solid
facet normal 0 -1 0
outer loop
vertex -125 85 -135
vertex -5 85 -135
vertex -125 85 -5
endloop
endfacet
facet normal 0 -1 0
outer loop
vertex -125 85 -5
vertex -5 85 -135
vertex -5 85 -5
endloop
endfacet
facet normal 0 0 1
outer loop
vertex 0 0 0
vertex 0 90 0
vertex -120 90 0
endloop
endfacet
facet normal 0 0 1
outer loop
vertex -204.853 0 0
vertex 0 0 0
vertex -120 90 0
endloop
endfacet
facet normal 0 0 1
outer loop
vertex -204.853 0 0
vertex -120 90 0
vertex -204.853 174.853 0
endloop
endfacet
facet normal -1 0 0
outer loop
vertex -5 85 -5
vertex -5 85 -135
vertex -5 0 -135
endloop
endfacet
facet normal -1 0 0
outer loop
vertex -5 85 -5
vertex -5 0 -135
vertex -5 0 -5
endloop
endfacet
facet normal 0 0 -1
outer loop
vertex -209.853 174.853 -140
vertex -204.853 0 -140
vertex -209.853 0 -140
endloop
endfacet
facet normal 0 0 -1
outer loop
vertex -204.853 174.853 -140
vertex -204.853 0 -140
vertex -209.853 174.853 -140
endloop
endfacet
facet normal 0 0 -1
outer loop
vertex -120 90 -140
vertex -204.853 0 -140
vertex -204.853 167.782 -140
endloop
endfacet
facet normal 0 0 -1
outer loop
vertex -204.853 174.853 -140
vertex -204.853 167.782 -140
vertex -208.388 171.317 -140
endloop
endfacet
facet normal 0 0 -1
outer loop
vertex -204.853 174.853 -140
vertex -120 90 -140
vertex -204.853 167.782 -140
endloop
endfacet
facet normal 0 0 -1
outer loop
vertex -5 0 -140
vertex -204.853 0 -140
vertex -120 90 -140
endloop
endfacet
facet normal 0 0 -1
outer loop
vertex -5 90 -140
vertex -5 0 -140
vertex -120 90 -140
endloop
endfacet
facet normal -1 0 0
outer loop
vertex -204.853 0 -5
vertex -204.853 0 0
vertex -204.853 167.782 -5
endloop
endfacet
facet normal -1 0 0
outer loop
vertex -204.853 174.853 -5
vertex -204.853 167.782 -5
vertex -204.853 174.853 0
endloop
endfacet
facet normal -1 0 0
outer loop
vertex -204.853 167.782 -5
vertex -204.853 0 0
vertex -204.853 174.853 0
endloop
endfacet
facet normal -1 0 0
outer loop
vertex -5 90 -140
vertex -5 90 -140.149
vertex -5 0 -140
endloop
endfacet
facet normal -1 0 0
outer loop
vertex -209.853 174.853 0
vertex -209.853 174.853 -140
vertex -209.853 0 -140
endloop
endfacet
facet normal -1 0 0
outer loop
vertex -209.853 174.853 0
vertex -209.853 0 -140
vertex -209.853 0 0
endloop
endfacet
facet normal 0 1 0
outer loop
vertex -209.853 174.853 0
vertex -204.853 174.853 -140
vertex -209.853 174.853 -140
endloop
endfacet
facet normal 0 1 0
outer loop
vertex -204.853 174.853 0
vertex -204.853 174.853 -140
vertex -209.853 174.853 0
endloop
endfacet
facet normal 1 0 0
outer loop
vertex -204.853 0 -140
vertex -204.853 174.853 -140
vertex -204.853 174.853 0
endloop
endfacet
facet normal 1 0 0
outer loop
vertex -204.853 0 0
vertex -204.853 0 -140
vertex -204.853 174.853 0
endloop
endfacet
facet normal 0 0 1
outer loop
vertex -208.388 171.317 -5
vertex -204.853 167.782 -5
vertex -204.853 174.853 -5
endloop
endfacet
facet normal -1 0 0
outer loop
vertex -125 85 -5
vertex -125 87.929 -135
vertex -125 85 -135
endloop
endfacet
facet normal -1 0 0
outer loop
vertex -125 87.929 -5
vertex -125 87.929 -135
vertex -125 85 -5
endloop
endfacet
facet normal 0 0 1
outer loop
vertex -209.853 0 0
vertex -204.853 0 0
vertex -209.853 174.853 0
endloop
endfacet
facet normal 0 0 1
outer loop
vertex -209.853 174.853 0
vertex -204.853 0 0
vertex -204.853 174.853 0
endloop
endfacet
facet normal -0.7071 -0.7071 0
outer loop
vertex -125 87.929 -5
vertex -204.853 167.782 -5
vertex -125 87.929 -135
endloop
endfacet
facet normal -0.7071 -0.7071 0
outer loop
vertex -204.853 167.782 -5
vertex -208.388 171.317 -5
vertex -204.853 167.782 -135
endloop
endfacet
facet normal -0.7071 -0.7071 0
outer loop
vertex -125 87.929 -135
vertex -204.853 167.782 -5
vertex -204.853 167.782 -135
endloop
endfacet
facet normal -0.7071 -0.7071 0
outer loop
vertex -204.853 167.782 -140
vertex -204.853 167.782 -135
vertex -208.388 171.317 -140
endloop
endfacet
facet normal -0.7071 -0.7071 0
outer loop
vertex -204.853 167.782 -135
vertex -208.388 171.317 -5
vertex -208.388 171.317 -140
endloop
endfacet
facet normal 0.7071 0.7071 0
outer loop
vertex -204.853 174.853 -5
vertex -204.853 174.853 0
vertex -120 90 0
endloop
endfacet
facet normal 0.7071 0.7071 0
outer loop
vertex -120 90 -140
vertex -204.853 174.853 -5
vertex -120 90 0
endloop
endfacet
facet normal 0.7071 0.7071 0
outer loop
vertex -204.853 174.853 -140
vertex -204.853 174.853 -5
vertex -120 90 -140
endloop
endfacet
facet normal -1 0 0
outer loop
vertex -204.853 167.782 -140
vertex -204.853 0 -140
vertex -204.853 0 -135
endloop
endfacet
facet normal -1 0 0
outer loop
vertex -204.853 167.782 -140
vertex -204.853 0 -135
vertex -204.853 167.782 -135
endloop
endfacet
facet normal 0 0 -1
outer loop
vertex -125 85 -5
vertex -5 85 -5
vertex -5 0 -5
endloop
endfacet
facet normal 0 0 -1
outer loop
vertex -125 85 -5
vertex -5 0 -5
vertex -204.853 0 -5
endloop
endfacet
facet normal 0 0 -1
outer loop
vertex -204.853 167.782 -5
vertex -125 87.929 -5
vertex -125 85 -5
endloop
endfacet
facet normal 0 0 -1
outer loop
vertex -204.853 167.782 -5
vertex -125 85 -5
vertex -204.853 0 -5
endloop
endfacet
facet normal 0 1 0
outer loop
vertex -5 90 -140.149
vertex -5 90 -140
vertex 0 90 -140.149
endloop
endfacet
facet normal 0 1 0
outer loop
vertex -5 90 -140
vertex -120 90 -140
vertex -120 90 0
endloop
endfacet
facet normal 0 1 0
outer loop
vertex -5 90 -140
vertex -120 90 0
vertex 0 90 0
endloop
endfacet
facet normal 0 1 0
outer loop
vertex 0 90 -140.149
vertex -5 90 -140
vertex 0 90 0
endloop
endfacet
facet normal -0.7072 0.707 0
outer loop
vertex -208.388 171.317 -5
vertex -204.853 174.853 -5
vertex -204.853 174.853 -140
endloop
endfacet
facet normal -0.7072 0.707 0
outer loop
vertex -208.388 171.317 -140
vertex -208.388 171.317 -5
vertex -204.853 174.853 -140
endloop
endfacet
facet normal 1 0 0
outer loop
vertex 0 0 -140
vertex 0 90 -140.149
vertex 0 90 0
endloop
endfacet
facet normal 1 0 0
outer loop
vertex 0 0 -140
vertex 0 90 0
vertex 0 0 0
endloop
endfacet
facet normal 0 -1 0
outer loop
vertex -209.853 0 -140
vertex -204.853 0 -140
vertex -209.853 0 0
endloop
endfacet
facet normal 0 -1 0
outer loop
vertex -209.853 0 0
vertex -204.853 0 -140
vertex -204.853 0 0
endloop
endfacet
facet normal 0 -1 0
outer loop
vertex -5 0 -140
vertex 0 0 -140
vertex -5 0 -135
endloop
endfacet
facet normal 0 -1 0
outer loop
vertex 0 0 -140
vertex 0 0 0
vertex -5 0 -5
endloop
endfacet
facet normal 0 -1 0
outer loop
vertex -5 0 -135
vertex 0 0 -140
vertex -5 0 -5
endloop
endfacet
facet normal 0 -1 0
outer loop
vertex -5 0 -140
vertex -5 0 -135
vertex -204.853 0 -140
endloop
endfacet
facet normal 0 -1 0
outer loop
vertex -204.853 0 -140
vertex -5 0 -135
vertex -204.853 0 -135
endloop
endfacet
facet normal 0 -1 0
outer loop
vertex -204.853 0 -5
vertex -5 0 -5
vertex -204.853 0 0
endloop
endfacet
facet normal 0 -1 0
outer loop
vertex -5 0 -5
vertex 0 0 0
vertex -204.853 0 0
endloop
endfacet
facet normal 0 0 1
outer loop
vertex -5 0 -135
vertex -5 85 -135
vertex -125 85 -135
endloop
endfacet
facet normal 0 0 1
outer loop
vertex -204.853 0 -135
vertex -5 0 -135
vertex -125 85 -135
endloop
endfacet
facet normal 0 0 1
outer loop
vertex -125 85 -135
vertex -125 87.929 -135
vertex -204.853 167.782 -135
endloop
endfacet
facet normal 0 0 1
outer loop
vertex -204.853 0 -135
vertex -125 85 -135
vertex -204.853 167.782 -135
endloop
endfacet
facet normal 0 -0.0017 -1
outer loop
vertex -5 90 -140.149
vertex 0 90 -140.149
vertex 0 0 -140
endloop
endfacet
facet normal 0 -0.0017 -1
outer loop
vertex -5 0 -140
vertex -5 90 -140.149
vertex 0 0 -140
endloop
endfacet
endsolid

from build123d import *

# Parameters (mm, degrees)
BOSS_EXTRUDE1_DEPTH  = 5
SKETCH2_W            = 120
SKETCH2_H            = 140
BOSS_EXTRUDE2_DEPTH  = 5
SKETCH4_W            = 135
SKETCH4_H            = 120
BOSS_EXTRUDE6_DEPTH  = 5
SKETCH5_W            = 140
SKETCH5_H            = 174.852813742
BOSS_EXTRUDE8_DEPTH  = 5
SKETCH6_W            = 135
SKETCH6_H            = 5
BOSS_EXTRUDE9_DEPTH  = 5
BOSS_EXTRUDE10_DEPTH = 5


with BuildPart() as part:
    # Sketch1 → Boss-Extrude1 (new body)
    with BuildSketch(Plane.XY):
        Polygon((0, 0), (-204.852813742, 0), (-204.852813742, 174.852813742), (-120, 90), (0, 90), align=None)
    boss_extrude1 = extrude(amount=-BOSS_EXTRUDE1_DEPTH)

    # Sketch2 → Boss-Extrude2 (add)
    with BuildSketch(Plane(origin=(0, 90, 0), x_dir=(1, 0, 0), z_dir=(0, 1, 0))):
        with Locations((-60, 70)):
            Rectangle(SKETCH2_W, SKETCH2_H)
    extrude(amount=-BOSS_EXTRUDE2_DEPTH)



with BuildPart() as body_2:
    # Sketch4 → Boss-Extrude6 (new body)
    with BuildSketch(Plane(origin=(-15, -15, 0), x_dir=(0, 0, -1), z_dir=(0.7071067811865483, 0.7071067811865468, 0))):
        with Locations((72.5, 208.492424049)):
            Rectangle(SKETCH4_W, SKETCH4_H)
    extrude(amount=-BOSS_EXTRUDE6_DEPTH)


with BuildPart() as body_3:
    # Sketch5 → Boss-Extrude8 (new body)
    with BuildSketch(Plane.ZY.offset(204.852813742)):
        with Locations((-70, 87.426406871)):
            Rectangle(SKETCH5_W, SKETCH5_H)
    extrude(amount=BOSS_EXTRUDE8_DEPTH)


with BuildPart() as part_1:
    add(part.part)

    add(body_2.part)  # Boss-Extrude9 merges body 2
    # Sketch6 → Boss-Extrude9 (add)
    with BuildSketch(Plane.ZY.offset(120)):
        with Locations((-72.5, 87.5)):
            Rectangle(SKETCH6_W, SKETCH6_H)
    extrude(amount=BOSS_EXTRUDE9_DEPTH)

    # Sketch7 → Boss-Extrude10 (add)
    with BuildSketch(Plane(origin=(0, 0, 0), x_dir=(0, 0, -1), z_dir=(1, 0, 0))):
        Polygon((0, 90), (140.148628639, 90), (140, 0), (0, 0), align=None)
    extrude(amount=-BOSS_EXTRUDE10_DEPTH)

    # Mirror1: Boss-Extrude1 across plane
    add(boss_extrude1.mirror(Plane.XY.offset(-70)))


solid = Compound([body_3.part, part_1.part])
